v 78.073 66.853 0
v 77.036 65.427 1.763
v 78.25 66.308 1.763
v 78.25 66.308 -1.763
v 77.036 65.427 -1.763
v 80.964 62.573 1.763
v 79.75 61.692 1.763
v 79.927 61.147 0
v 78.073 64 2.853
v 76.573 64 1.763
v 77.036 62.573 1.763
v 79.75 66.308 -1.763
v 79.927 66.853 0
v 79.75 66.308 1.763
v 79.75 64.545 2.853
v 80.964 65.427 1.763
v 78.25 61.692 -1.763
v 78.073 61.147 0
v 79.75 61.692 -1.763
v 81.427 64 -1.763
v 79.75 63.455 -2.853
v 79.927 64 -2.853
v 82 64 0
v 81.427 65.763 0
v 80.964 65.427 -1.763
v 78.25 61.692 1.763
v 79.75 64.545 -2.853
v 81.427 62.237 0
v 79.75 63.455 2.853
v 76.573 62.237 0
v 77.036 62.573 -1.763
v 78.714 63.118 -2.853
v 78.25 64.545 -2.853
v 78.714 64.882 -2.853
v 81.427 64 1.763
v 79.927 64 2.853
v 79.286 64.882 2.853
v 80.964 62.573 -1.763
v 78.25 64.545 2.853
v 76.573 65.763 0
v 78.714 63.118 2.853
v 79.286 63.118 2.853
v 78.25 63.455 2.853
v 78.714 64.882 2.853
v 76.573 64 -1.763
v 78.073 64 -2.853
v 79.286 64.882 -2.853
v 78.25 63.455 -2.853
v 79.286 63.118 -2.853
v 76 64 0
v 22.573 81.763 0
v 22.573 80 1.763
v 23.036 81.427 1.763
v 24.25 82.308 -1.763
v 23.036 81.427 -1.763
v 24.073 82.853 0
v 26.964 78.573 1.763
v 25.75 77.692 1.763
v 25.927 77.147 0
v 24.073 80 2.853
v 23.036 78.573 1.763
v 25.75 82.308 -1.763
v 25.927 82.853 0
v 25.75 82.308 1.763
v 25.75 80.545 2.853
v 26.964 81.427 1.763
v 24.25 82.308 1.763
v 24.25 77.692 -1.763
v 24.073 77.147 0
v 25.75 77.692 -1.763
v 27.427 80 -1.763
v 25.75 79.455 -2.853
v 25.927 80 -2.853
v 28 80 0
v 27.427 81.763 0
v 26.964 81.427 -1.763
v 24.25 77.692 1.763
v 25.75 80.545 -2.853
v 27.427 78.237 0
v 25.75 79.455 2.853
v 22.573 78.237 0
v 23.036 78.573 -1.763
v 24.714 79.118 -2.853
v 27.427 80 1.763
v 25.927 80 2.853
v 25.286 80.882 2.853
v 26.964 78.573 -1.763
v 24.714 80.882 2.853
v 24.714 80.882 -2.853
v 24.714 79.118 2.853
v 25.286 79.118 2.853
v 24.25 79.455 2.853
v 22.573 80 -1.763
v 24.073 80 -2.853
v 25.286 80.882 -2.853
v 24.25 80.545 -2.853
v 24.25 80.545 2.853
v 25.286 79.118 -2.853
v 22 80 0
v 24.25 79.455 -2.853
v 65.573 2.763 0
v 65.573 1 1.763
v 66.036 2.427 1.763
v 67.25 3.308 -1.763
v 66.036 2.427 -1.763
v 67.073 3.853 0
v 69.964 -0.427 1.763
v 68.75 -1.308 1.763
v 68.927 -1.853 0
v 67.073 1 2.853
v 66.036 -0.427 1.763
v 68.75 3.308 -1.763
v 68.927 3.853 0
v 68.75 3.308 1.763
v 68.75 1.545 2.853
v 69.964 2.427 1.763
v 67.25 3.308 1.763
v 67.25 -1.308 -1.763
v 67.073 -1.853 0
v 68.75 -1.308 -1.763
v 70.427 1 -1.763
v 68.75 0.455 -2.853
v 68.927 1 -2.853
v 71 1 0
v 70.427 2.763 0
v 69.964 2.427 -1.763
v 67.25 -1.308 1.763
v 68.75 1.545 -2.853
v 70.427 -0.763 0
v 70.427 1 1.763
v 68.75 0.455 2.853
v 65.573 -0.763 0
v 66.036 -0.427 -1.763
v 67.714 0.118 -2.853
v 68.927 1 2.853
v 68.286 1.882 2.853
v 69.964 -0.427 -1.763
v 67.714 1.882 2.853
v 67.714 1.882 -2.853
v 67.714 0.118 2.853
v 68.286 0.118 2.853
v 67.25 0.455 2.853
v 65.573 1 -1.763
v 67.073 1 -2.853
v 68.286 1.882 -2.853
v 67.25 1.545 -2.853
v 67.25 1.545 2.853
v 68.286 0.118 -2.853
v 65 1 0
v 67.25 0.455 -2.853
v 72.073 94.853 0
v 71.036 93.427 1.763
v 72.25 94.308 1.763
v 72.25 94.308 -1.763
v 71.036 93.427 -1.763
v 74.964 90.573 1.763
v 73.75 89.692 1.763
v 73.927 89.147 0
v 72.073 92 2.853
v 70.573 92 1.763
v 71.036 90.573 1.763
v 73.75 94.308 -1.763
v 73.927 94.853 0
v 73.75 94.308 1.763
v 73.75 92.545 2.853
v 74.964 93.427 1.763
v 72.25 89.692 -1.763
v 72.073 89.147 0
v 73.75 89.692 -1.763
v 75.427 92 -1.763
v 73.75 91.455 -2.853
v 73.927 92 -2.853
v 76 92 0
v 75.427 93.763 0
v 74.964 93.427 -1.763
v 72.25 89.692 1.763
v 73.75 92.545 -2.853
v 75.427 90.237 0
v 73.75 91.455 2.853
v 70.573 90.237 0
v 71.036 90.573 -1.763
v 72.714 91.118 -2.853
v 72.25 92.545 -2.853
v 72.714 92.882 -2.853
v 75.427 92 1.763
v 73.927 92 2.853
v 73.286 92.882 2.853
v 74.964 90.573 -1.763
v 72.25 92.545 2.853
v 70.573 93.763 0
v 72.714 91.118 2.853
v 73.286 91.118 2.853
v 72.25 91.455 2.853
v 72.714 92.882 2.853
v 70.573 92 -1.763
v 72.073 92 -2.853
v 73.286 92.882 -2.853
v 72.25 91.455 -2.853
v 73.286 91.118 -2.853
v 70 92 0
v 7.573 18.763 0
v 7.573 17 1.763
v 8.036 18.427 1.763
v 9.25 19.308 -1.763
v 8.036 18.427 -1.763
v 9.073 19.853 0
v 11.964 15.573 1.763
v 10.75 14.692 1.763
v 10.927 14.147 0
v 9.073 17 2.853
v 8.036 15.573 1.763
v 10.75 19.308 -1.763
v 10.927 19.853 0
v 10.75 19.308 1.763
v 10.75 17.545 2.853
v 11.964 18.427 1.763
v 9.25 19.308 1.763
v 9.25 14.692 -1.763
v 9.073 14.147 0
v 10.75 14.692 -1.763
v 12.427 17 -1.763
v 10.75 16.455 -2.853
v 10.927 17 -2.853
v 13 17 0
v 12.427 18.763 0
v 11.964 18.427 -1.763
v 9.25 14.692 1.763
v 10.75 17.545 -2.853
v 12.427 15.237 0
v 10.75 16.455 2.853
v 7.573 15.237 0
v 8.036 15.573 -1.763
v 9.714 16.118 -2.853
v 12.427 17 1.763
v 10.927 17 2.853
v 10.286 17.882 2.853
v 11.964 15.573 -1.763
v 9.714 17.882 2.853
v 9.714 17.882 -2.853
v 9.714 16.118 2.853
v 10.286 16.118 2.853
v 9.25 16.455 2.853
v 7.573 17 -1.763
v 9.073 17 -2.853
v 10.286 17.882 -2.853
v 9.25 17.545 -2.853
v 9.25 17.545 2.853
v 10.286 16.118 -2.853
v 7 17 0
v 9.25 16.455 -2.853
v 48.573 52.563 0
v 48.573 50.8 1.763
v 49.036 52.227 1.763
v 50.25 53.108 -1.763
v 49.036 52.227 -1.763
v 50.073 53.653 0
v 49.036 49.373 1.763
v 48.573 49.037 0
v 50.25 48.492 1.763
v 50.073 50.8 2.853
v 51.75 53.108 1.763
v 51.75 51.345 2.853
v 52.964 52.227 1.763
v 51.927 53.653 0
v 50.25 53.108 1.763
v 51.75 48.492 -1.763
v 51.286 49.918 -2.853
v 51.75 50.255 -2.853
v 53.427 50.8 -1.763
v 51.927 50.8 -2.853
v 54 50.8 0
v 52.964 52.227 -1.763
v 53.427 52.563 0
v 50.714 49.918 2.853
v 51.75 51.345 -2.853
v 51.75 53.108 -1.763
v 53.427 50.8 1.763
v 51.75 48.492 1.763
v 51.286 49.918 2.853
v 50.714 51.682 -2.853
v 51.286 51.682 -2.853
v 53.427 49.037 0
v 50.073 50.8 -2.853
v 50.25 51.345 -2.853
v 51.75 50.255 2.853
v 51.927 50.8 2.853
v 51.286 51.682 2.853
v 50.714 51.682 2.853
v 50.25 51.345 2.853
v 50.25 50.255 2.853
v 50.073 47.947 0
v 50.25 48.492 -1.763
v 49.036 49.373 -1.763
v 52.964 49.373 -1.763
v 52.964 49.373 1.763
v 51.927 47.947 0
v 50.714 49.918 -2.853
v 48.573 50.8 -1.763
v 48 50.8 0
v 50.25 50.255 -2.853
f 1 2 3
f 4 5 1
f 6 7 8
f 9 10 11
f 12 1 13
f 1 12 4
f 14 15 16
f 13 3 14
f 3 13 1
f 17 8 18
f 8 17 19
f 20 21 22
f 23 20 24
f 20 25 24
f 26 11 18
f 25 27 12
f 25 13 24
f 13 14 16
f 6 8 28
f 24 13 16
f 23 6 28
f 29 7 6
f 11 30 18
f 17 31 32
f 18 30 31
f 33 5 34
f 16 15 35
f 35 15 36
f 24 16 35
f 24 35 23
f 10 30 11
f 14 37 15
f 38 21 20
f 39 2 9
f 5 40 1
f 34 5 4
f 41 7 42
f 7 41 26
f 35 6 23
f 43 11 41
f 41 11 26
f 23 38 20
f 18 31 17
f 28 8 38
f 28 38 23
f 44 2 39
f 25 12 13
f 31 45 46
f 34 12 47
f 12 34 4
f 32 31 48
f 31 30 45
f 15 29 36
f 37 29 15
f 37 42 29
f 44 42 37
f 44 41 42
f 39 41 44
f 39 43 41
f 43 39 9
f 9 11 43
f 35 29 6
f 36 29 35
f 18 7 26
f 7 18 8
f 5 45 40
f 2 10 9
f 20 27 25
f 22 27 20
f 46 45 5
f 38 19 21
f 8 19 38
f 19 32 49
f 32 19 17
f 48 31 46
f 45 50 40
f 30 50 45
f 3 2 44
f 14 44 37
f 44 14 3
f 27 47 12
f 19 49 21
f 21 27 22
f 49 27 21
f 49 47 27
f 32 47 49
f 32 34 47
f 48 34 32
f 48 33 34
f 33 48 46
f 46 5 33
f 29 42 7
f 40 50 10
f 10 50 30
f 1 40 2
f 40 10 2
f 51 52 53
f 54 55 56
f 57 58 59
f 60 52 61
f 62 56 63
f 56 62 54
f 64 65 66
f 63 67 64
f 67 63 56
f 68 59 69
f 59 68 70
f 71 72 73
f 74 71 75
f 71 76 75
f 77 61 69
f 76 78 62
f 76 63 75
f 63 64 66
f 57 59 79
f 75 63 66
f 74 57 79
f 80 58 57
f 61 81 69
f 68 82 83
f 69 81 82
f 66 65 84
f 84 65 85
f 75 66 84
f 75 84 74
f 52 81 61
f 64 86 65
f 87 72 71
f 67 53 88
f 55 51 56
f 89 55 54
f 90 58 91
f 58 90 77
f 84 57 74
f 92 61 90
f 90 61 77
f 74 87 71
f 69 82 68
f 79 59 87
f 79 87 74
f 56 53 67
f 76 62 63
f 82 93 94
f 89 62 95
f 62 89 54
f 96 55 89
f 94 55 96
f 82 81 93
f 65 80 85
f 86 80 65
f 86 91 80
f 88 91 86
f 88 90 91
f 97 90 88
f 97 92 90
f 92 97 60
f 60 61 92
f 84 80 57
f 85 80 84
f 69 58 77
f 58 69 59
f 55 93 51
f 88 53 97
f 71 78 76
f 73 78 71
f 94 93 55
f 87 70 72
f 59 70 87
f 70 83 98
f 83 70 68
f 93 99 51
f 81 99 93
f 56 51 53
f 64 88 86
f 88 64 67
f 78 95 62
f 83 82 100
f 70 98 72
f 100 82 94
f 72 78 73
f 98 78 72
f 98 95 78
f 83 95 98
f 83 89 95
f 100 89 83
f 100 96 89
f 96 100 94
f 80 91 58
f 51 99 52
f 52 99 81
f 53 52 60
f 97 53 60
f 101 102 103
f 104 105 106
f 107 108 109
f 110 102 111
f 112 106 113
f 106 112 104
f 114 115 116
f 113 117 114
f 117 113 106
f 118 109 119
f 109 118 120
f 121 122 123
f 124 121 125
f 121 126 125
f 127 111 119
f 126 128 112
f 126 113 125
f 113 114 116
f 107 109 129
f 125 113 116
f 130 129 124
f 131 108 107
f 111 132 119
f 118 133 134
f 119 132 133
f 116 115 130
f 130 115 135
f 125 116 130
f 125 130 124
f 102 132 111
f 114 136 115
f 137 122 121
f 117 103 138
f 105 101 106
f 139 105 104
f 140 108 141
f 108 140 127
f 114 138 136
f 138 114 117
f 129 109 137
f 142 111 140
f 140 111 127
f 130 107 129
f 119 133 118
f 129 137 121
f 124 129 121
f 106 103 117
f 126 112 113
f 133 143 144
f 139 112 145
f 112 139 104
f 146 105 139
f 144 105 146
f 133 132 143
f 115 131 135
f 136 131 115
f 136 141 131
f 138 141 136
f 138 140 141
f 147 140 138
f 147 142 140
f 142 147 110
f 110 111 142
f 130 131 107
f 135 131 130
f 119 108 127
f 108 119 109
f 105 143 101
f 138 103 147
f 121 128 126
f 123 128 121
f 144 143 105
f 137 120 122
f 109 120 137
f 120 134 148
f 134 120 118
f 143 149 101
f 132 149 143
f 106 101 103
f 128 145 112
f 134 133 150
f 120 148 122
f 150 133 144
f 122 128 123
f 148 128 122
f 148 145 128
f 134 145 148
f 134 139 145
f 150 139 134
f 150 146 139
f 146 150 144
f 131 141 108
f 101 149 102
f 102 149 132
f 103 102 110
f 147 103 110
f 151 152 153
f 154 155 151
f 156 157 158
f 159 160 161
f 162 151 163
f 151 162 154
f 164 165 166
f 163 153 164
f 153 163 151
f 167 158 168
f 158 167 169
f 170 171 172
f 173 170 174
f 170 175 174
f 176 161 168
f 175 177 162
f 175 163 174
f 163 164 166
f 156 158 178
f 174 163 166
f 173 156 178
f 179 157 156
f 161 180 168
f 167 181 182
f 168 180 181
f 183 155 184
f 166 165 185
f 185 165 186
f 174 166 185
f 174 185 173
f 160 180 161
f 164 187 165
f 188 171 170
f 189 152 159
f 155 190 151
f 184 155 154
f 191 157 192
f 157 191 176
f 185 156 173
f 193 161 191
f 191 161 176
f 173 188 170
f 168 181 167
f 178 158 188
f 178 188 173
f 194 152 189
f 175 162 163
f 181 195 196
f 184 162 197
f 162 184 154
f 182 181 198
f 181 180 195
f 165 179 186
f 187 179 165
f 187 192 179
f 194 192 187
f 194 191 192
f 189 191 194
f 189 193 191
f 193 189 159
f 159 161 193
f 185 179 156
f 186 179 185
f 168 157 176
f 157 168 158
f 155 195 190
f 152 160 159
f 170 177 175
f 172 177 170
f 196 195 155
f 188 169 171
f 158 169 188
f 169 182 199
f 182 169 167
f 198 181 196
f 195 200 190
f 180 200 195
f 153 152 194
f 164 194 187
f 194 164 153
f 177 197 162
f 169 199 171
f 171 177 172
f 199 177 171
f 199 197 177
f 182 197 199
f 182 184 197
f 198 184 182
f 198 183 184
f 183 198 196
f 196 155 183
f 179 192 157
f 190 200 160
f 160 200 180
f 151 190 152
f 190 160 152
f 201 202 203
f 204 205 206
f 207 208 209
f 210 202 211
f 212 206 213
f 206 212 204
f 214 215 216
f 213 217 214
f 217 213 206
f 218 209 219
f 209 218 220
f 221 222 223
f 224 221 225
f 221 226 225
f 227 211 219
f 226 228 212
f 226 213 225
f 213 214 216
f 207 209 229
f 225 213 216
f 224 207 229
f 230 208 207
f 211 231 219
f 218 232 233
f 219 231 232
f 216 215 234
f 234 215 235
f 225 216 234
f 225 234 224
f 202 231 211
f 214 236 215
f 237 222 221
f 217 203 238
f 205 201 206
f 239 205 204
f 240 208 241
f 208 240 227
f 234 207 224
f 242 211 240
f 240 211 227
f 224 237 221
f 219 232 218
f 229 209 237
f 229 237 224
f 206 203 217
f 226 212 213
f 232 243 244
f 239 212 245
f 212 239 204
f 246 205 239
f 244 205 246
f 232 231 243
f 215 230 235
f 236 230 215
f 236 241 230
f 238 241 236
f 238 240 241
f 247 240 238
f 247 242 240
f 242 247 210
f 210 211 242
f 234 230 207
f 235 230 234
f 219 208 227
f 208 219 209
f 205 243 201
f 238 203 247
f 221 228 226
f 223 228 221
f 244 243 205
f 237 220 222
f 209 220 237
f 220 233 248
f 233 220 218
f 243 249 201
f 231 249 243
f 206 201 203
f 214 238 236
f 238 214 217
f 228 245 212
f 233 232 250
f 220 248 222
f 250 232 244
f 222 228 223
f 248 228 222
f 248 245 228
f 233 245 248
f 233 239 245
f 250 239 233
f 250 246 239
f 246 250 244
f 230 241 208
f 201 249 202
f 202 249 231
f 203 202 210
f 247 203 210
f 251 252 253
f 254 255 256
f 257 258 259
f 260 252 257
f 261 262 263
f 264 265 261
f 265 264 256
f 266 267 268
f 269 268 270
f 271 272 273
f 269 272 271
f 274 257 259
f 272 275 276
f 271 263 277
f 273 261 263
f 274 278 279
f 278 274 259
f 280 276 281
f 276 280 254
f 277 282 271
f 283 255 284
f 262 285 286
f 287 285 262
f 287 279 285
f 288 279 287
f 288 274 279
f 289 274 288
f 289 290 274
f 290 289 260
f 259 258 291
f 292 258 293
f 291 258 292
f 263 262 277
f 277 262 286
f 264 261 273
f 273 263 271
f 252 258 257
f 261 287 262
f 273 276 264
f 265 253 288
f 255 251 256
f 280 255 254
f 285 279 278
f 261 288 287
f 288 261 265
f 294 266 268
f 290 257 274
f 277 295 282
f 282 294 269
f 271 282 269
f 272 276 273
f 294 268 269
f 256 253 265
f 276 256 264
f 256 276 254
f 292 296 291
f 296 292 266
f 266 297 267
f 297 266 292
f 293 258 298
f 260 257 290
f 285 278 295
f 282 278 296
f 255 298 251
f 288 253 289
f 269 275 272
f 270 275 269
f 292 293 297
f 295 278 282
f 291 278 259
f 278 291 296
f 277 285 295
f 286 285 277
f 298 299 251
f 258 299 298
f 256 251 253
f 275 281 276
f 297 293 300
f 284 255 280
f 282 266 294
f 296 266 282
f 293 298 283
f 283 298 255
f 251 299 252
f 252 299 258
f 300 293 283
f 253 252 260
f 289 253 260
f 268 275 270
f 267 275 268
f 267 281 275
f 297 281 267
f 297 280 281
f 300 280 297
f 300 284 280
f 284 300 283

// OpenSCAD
//aabb bounding box

//找出點集合的上下左右的極值，在圍成正方形

//arithmetic mean

function rnd_v(init_value,end_value)=round(rands(init_value,end_value,1)[0]);            
function rnd_points(width,length,amount)=
     [for(i=[0:amount-1])
        [rnd_v(0,width),rnd_v(0,length)]];     
array=rnd_points(100,100,5) ;
for(i=array)
     translate(i)
         sphere(3);
function sum(list)=
      let(leng=len(list))
      leng==1?list[0]:
      leng==2?list[0]+list[1]:
      let( 
          sum_first=list[0]+list[1],
          sum_after=[for(i=[2:leng-1])
              list[i]])    
      sum(concat(sum_first,sum_after));
function arithmetic_mean(array)=
     let(amount=len(array))
     let(x=[for(i=array)
          i.x
          ])
     let(y=[for(i=array)
          i.y
          ]) 
     [sum(x)/amount,sum(y)/amount];
translate(arithmetic_mean(array)) 
     color("red")
     sphere(3);
     
     
function distance(center_point,points)=
[ for(i=points)
    pow(
    (pow((center_point.x-i.x),2)+pow((center_point.y-i.y),2)),
        1/2)     
     ];


     
     
     
     
     
     
     
